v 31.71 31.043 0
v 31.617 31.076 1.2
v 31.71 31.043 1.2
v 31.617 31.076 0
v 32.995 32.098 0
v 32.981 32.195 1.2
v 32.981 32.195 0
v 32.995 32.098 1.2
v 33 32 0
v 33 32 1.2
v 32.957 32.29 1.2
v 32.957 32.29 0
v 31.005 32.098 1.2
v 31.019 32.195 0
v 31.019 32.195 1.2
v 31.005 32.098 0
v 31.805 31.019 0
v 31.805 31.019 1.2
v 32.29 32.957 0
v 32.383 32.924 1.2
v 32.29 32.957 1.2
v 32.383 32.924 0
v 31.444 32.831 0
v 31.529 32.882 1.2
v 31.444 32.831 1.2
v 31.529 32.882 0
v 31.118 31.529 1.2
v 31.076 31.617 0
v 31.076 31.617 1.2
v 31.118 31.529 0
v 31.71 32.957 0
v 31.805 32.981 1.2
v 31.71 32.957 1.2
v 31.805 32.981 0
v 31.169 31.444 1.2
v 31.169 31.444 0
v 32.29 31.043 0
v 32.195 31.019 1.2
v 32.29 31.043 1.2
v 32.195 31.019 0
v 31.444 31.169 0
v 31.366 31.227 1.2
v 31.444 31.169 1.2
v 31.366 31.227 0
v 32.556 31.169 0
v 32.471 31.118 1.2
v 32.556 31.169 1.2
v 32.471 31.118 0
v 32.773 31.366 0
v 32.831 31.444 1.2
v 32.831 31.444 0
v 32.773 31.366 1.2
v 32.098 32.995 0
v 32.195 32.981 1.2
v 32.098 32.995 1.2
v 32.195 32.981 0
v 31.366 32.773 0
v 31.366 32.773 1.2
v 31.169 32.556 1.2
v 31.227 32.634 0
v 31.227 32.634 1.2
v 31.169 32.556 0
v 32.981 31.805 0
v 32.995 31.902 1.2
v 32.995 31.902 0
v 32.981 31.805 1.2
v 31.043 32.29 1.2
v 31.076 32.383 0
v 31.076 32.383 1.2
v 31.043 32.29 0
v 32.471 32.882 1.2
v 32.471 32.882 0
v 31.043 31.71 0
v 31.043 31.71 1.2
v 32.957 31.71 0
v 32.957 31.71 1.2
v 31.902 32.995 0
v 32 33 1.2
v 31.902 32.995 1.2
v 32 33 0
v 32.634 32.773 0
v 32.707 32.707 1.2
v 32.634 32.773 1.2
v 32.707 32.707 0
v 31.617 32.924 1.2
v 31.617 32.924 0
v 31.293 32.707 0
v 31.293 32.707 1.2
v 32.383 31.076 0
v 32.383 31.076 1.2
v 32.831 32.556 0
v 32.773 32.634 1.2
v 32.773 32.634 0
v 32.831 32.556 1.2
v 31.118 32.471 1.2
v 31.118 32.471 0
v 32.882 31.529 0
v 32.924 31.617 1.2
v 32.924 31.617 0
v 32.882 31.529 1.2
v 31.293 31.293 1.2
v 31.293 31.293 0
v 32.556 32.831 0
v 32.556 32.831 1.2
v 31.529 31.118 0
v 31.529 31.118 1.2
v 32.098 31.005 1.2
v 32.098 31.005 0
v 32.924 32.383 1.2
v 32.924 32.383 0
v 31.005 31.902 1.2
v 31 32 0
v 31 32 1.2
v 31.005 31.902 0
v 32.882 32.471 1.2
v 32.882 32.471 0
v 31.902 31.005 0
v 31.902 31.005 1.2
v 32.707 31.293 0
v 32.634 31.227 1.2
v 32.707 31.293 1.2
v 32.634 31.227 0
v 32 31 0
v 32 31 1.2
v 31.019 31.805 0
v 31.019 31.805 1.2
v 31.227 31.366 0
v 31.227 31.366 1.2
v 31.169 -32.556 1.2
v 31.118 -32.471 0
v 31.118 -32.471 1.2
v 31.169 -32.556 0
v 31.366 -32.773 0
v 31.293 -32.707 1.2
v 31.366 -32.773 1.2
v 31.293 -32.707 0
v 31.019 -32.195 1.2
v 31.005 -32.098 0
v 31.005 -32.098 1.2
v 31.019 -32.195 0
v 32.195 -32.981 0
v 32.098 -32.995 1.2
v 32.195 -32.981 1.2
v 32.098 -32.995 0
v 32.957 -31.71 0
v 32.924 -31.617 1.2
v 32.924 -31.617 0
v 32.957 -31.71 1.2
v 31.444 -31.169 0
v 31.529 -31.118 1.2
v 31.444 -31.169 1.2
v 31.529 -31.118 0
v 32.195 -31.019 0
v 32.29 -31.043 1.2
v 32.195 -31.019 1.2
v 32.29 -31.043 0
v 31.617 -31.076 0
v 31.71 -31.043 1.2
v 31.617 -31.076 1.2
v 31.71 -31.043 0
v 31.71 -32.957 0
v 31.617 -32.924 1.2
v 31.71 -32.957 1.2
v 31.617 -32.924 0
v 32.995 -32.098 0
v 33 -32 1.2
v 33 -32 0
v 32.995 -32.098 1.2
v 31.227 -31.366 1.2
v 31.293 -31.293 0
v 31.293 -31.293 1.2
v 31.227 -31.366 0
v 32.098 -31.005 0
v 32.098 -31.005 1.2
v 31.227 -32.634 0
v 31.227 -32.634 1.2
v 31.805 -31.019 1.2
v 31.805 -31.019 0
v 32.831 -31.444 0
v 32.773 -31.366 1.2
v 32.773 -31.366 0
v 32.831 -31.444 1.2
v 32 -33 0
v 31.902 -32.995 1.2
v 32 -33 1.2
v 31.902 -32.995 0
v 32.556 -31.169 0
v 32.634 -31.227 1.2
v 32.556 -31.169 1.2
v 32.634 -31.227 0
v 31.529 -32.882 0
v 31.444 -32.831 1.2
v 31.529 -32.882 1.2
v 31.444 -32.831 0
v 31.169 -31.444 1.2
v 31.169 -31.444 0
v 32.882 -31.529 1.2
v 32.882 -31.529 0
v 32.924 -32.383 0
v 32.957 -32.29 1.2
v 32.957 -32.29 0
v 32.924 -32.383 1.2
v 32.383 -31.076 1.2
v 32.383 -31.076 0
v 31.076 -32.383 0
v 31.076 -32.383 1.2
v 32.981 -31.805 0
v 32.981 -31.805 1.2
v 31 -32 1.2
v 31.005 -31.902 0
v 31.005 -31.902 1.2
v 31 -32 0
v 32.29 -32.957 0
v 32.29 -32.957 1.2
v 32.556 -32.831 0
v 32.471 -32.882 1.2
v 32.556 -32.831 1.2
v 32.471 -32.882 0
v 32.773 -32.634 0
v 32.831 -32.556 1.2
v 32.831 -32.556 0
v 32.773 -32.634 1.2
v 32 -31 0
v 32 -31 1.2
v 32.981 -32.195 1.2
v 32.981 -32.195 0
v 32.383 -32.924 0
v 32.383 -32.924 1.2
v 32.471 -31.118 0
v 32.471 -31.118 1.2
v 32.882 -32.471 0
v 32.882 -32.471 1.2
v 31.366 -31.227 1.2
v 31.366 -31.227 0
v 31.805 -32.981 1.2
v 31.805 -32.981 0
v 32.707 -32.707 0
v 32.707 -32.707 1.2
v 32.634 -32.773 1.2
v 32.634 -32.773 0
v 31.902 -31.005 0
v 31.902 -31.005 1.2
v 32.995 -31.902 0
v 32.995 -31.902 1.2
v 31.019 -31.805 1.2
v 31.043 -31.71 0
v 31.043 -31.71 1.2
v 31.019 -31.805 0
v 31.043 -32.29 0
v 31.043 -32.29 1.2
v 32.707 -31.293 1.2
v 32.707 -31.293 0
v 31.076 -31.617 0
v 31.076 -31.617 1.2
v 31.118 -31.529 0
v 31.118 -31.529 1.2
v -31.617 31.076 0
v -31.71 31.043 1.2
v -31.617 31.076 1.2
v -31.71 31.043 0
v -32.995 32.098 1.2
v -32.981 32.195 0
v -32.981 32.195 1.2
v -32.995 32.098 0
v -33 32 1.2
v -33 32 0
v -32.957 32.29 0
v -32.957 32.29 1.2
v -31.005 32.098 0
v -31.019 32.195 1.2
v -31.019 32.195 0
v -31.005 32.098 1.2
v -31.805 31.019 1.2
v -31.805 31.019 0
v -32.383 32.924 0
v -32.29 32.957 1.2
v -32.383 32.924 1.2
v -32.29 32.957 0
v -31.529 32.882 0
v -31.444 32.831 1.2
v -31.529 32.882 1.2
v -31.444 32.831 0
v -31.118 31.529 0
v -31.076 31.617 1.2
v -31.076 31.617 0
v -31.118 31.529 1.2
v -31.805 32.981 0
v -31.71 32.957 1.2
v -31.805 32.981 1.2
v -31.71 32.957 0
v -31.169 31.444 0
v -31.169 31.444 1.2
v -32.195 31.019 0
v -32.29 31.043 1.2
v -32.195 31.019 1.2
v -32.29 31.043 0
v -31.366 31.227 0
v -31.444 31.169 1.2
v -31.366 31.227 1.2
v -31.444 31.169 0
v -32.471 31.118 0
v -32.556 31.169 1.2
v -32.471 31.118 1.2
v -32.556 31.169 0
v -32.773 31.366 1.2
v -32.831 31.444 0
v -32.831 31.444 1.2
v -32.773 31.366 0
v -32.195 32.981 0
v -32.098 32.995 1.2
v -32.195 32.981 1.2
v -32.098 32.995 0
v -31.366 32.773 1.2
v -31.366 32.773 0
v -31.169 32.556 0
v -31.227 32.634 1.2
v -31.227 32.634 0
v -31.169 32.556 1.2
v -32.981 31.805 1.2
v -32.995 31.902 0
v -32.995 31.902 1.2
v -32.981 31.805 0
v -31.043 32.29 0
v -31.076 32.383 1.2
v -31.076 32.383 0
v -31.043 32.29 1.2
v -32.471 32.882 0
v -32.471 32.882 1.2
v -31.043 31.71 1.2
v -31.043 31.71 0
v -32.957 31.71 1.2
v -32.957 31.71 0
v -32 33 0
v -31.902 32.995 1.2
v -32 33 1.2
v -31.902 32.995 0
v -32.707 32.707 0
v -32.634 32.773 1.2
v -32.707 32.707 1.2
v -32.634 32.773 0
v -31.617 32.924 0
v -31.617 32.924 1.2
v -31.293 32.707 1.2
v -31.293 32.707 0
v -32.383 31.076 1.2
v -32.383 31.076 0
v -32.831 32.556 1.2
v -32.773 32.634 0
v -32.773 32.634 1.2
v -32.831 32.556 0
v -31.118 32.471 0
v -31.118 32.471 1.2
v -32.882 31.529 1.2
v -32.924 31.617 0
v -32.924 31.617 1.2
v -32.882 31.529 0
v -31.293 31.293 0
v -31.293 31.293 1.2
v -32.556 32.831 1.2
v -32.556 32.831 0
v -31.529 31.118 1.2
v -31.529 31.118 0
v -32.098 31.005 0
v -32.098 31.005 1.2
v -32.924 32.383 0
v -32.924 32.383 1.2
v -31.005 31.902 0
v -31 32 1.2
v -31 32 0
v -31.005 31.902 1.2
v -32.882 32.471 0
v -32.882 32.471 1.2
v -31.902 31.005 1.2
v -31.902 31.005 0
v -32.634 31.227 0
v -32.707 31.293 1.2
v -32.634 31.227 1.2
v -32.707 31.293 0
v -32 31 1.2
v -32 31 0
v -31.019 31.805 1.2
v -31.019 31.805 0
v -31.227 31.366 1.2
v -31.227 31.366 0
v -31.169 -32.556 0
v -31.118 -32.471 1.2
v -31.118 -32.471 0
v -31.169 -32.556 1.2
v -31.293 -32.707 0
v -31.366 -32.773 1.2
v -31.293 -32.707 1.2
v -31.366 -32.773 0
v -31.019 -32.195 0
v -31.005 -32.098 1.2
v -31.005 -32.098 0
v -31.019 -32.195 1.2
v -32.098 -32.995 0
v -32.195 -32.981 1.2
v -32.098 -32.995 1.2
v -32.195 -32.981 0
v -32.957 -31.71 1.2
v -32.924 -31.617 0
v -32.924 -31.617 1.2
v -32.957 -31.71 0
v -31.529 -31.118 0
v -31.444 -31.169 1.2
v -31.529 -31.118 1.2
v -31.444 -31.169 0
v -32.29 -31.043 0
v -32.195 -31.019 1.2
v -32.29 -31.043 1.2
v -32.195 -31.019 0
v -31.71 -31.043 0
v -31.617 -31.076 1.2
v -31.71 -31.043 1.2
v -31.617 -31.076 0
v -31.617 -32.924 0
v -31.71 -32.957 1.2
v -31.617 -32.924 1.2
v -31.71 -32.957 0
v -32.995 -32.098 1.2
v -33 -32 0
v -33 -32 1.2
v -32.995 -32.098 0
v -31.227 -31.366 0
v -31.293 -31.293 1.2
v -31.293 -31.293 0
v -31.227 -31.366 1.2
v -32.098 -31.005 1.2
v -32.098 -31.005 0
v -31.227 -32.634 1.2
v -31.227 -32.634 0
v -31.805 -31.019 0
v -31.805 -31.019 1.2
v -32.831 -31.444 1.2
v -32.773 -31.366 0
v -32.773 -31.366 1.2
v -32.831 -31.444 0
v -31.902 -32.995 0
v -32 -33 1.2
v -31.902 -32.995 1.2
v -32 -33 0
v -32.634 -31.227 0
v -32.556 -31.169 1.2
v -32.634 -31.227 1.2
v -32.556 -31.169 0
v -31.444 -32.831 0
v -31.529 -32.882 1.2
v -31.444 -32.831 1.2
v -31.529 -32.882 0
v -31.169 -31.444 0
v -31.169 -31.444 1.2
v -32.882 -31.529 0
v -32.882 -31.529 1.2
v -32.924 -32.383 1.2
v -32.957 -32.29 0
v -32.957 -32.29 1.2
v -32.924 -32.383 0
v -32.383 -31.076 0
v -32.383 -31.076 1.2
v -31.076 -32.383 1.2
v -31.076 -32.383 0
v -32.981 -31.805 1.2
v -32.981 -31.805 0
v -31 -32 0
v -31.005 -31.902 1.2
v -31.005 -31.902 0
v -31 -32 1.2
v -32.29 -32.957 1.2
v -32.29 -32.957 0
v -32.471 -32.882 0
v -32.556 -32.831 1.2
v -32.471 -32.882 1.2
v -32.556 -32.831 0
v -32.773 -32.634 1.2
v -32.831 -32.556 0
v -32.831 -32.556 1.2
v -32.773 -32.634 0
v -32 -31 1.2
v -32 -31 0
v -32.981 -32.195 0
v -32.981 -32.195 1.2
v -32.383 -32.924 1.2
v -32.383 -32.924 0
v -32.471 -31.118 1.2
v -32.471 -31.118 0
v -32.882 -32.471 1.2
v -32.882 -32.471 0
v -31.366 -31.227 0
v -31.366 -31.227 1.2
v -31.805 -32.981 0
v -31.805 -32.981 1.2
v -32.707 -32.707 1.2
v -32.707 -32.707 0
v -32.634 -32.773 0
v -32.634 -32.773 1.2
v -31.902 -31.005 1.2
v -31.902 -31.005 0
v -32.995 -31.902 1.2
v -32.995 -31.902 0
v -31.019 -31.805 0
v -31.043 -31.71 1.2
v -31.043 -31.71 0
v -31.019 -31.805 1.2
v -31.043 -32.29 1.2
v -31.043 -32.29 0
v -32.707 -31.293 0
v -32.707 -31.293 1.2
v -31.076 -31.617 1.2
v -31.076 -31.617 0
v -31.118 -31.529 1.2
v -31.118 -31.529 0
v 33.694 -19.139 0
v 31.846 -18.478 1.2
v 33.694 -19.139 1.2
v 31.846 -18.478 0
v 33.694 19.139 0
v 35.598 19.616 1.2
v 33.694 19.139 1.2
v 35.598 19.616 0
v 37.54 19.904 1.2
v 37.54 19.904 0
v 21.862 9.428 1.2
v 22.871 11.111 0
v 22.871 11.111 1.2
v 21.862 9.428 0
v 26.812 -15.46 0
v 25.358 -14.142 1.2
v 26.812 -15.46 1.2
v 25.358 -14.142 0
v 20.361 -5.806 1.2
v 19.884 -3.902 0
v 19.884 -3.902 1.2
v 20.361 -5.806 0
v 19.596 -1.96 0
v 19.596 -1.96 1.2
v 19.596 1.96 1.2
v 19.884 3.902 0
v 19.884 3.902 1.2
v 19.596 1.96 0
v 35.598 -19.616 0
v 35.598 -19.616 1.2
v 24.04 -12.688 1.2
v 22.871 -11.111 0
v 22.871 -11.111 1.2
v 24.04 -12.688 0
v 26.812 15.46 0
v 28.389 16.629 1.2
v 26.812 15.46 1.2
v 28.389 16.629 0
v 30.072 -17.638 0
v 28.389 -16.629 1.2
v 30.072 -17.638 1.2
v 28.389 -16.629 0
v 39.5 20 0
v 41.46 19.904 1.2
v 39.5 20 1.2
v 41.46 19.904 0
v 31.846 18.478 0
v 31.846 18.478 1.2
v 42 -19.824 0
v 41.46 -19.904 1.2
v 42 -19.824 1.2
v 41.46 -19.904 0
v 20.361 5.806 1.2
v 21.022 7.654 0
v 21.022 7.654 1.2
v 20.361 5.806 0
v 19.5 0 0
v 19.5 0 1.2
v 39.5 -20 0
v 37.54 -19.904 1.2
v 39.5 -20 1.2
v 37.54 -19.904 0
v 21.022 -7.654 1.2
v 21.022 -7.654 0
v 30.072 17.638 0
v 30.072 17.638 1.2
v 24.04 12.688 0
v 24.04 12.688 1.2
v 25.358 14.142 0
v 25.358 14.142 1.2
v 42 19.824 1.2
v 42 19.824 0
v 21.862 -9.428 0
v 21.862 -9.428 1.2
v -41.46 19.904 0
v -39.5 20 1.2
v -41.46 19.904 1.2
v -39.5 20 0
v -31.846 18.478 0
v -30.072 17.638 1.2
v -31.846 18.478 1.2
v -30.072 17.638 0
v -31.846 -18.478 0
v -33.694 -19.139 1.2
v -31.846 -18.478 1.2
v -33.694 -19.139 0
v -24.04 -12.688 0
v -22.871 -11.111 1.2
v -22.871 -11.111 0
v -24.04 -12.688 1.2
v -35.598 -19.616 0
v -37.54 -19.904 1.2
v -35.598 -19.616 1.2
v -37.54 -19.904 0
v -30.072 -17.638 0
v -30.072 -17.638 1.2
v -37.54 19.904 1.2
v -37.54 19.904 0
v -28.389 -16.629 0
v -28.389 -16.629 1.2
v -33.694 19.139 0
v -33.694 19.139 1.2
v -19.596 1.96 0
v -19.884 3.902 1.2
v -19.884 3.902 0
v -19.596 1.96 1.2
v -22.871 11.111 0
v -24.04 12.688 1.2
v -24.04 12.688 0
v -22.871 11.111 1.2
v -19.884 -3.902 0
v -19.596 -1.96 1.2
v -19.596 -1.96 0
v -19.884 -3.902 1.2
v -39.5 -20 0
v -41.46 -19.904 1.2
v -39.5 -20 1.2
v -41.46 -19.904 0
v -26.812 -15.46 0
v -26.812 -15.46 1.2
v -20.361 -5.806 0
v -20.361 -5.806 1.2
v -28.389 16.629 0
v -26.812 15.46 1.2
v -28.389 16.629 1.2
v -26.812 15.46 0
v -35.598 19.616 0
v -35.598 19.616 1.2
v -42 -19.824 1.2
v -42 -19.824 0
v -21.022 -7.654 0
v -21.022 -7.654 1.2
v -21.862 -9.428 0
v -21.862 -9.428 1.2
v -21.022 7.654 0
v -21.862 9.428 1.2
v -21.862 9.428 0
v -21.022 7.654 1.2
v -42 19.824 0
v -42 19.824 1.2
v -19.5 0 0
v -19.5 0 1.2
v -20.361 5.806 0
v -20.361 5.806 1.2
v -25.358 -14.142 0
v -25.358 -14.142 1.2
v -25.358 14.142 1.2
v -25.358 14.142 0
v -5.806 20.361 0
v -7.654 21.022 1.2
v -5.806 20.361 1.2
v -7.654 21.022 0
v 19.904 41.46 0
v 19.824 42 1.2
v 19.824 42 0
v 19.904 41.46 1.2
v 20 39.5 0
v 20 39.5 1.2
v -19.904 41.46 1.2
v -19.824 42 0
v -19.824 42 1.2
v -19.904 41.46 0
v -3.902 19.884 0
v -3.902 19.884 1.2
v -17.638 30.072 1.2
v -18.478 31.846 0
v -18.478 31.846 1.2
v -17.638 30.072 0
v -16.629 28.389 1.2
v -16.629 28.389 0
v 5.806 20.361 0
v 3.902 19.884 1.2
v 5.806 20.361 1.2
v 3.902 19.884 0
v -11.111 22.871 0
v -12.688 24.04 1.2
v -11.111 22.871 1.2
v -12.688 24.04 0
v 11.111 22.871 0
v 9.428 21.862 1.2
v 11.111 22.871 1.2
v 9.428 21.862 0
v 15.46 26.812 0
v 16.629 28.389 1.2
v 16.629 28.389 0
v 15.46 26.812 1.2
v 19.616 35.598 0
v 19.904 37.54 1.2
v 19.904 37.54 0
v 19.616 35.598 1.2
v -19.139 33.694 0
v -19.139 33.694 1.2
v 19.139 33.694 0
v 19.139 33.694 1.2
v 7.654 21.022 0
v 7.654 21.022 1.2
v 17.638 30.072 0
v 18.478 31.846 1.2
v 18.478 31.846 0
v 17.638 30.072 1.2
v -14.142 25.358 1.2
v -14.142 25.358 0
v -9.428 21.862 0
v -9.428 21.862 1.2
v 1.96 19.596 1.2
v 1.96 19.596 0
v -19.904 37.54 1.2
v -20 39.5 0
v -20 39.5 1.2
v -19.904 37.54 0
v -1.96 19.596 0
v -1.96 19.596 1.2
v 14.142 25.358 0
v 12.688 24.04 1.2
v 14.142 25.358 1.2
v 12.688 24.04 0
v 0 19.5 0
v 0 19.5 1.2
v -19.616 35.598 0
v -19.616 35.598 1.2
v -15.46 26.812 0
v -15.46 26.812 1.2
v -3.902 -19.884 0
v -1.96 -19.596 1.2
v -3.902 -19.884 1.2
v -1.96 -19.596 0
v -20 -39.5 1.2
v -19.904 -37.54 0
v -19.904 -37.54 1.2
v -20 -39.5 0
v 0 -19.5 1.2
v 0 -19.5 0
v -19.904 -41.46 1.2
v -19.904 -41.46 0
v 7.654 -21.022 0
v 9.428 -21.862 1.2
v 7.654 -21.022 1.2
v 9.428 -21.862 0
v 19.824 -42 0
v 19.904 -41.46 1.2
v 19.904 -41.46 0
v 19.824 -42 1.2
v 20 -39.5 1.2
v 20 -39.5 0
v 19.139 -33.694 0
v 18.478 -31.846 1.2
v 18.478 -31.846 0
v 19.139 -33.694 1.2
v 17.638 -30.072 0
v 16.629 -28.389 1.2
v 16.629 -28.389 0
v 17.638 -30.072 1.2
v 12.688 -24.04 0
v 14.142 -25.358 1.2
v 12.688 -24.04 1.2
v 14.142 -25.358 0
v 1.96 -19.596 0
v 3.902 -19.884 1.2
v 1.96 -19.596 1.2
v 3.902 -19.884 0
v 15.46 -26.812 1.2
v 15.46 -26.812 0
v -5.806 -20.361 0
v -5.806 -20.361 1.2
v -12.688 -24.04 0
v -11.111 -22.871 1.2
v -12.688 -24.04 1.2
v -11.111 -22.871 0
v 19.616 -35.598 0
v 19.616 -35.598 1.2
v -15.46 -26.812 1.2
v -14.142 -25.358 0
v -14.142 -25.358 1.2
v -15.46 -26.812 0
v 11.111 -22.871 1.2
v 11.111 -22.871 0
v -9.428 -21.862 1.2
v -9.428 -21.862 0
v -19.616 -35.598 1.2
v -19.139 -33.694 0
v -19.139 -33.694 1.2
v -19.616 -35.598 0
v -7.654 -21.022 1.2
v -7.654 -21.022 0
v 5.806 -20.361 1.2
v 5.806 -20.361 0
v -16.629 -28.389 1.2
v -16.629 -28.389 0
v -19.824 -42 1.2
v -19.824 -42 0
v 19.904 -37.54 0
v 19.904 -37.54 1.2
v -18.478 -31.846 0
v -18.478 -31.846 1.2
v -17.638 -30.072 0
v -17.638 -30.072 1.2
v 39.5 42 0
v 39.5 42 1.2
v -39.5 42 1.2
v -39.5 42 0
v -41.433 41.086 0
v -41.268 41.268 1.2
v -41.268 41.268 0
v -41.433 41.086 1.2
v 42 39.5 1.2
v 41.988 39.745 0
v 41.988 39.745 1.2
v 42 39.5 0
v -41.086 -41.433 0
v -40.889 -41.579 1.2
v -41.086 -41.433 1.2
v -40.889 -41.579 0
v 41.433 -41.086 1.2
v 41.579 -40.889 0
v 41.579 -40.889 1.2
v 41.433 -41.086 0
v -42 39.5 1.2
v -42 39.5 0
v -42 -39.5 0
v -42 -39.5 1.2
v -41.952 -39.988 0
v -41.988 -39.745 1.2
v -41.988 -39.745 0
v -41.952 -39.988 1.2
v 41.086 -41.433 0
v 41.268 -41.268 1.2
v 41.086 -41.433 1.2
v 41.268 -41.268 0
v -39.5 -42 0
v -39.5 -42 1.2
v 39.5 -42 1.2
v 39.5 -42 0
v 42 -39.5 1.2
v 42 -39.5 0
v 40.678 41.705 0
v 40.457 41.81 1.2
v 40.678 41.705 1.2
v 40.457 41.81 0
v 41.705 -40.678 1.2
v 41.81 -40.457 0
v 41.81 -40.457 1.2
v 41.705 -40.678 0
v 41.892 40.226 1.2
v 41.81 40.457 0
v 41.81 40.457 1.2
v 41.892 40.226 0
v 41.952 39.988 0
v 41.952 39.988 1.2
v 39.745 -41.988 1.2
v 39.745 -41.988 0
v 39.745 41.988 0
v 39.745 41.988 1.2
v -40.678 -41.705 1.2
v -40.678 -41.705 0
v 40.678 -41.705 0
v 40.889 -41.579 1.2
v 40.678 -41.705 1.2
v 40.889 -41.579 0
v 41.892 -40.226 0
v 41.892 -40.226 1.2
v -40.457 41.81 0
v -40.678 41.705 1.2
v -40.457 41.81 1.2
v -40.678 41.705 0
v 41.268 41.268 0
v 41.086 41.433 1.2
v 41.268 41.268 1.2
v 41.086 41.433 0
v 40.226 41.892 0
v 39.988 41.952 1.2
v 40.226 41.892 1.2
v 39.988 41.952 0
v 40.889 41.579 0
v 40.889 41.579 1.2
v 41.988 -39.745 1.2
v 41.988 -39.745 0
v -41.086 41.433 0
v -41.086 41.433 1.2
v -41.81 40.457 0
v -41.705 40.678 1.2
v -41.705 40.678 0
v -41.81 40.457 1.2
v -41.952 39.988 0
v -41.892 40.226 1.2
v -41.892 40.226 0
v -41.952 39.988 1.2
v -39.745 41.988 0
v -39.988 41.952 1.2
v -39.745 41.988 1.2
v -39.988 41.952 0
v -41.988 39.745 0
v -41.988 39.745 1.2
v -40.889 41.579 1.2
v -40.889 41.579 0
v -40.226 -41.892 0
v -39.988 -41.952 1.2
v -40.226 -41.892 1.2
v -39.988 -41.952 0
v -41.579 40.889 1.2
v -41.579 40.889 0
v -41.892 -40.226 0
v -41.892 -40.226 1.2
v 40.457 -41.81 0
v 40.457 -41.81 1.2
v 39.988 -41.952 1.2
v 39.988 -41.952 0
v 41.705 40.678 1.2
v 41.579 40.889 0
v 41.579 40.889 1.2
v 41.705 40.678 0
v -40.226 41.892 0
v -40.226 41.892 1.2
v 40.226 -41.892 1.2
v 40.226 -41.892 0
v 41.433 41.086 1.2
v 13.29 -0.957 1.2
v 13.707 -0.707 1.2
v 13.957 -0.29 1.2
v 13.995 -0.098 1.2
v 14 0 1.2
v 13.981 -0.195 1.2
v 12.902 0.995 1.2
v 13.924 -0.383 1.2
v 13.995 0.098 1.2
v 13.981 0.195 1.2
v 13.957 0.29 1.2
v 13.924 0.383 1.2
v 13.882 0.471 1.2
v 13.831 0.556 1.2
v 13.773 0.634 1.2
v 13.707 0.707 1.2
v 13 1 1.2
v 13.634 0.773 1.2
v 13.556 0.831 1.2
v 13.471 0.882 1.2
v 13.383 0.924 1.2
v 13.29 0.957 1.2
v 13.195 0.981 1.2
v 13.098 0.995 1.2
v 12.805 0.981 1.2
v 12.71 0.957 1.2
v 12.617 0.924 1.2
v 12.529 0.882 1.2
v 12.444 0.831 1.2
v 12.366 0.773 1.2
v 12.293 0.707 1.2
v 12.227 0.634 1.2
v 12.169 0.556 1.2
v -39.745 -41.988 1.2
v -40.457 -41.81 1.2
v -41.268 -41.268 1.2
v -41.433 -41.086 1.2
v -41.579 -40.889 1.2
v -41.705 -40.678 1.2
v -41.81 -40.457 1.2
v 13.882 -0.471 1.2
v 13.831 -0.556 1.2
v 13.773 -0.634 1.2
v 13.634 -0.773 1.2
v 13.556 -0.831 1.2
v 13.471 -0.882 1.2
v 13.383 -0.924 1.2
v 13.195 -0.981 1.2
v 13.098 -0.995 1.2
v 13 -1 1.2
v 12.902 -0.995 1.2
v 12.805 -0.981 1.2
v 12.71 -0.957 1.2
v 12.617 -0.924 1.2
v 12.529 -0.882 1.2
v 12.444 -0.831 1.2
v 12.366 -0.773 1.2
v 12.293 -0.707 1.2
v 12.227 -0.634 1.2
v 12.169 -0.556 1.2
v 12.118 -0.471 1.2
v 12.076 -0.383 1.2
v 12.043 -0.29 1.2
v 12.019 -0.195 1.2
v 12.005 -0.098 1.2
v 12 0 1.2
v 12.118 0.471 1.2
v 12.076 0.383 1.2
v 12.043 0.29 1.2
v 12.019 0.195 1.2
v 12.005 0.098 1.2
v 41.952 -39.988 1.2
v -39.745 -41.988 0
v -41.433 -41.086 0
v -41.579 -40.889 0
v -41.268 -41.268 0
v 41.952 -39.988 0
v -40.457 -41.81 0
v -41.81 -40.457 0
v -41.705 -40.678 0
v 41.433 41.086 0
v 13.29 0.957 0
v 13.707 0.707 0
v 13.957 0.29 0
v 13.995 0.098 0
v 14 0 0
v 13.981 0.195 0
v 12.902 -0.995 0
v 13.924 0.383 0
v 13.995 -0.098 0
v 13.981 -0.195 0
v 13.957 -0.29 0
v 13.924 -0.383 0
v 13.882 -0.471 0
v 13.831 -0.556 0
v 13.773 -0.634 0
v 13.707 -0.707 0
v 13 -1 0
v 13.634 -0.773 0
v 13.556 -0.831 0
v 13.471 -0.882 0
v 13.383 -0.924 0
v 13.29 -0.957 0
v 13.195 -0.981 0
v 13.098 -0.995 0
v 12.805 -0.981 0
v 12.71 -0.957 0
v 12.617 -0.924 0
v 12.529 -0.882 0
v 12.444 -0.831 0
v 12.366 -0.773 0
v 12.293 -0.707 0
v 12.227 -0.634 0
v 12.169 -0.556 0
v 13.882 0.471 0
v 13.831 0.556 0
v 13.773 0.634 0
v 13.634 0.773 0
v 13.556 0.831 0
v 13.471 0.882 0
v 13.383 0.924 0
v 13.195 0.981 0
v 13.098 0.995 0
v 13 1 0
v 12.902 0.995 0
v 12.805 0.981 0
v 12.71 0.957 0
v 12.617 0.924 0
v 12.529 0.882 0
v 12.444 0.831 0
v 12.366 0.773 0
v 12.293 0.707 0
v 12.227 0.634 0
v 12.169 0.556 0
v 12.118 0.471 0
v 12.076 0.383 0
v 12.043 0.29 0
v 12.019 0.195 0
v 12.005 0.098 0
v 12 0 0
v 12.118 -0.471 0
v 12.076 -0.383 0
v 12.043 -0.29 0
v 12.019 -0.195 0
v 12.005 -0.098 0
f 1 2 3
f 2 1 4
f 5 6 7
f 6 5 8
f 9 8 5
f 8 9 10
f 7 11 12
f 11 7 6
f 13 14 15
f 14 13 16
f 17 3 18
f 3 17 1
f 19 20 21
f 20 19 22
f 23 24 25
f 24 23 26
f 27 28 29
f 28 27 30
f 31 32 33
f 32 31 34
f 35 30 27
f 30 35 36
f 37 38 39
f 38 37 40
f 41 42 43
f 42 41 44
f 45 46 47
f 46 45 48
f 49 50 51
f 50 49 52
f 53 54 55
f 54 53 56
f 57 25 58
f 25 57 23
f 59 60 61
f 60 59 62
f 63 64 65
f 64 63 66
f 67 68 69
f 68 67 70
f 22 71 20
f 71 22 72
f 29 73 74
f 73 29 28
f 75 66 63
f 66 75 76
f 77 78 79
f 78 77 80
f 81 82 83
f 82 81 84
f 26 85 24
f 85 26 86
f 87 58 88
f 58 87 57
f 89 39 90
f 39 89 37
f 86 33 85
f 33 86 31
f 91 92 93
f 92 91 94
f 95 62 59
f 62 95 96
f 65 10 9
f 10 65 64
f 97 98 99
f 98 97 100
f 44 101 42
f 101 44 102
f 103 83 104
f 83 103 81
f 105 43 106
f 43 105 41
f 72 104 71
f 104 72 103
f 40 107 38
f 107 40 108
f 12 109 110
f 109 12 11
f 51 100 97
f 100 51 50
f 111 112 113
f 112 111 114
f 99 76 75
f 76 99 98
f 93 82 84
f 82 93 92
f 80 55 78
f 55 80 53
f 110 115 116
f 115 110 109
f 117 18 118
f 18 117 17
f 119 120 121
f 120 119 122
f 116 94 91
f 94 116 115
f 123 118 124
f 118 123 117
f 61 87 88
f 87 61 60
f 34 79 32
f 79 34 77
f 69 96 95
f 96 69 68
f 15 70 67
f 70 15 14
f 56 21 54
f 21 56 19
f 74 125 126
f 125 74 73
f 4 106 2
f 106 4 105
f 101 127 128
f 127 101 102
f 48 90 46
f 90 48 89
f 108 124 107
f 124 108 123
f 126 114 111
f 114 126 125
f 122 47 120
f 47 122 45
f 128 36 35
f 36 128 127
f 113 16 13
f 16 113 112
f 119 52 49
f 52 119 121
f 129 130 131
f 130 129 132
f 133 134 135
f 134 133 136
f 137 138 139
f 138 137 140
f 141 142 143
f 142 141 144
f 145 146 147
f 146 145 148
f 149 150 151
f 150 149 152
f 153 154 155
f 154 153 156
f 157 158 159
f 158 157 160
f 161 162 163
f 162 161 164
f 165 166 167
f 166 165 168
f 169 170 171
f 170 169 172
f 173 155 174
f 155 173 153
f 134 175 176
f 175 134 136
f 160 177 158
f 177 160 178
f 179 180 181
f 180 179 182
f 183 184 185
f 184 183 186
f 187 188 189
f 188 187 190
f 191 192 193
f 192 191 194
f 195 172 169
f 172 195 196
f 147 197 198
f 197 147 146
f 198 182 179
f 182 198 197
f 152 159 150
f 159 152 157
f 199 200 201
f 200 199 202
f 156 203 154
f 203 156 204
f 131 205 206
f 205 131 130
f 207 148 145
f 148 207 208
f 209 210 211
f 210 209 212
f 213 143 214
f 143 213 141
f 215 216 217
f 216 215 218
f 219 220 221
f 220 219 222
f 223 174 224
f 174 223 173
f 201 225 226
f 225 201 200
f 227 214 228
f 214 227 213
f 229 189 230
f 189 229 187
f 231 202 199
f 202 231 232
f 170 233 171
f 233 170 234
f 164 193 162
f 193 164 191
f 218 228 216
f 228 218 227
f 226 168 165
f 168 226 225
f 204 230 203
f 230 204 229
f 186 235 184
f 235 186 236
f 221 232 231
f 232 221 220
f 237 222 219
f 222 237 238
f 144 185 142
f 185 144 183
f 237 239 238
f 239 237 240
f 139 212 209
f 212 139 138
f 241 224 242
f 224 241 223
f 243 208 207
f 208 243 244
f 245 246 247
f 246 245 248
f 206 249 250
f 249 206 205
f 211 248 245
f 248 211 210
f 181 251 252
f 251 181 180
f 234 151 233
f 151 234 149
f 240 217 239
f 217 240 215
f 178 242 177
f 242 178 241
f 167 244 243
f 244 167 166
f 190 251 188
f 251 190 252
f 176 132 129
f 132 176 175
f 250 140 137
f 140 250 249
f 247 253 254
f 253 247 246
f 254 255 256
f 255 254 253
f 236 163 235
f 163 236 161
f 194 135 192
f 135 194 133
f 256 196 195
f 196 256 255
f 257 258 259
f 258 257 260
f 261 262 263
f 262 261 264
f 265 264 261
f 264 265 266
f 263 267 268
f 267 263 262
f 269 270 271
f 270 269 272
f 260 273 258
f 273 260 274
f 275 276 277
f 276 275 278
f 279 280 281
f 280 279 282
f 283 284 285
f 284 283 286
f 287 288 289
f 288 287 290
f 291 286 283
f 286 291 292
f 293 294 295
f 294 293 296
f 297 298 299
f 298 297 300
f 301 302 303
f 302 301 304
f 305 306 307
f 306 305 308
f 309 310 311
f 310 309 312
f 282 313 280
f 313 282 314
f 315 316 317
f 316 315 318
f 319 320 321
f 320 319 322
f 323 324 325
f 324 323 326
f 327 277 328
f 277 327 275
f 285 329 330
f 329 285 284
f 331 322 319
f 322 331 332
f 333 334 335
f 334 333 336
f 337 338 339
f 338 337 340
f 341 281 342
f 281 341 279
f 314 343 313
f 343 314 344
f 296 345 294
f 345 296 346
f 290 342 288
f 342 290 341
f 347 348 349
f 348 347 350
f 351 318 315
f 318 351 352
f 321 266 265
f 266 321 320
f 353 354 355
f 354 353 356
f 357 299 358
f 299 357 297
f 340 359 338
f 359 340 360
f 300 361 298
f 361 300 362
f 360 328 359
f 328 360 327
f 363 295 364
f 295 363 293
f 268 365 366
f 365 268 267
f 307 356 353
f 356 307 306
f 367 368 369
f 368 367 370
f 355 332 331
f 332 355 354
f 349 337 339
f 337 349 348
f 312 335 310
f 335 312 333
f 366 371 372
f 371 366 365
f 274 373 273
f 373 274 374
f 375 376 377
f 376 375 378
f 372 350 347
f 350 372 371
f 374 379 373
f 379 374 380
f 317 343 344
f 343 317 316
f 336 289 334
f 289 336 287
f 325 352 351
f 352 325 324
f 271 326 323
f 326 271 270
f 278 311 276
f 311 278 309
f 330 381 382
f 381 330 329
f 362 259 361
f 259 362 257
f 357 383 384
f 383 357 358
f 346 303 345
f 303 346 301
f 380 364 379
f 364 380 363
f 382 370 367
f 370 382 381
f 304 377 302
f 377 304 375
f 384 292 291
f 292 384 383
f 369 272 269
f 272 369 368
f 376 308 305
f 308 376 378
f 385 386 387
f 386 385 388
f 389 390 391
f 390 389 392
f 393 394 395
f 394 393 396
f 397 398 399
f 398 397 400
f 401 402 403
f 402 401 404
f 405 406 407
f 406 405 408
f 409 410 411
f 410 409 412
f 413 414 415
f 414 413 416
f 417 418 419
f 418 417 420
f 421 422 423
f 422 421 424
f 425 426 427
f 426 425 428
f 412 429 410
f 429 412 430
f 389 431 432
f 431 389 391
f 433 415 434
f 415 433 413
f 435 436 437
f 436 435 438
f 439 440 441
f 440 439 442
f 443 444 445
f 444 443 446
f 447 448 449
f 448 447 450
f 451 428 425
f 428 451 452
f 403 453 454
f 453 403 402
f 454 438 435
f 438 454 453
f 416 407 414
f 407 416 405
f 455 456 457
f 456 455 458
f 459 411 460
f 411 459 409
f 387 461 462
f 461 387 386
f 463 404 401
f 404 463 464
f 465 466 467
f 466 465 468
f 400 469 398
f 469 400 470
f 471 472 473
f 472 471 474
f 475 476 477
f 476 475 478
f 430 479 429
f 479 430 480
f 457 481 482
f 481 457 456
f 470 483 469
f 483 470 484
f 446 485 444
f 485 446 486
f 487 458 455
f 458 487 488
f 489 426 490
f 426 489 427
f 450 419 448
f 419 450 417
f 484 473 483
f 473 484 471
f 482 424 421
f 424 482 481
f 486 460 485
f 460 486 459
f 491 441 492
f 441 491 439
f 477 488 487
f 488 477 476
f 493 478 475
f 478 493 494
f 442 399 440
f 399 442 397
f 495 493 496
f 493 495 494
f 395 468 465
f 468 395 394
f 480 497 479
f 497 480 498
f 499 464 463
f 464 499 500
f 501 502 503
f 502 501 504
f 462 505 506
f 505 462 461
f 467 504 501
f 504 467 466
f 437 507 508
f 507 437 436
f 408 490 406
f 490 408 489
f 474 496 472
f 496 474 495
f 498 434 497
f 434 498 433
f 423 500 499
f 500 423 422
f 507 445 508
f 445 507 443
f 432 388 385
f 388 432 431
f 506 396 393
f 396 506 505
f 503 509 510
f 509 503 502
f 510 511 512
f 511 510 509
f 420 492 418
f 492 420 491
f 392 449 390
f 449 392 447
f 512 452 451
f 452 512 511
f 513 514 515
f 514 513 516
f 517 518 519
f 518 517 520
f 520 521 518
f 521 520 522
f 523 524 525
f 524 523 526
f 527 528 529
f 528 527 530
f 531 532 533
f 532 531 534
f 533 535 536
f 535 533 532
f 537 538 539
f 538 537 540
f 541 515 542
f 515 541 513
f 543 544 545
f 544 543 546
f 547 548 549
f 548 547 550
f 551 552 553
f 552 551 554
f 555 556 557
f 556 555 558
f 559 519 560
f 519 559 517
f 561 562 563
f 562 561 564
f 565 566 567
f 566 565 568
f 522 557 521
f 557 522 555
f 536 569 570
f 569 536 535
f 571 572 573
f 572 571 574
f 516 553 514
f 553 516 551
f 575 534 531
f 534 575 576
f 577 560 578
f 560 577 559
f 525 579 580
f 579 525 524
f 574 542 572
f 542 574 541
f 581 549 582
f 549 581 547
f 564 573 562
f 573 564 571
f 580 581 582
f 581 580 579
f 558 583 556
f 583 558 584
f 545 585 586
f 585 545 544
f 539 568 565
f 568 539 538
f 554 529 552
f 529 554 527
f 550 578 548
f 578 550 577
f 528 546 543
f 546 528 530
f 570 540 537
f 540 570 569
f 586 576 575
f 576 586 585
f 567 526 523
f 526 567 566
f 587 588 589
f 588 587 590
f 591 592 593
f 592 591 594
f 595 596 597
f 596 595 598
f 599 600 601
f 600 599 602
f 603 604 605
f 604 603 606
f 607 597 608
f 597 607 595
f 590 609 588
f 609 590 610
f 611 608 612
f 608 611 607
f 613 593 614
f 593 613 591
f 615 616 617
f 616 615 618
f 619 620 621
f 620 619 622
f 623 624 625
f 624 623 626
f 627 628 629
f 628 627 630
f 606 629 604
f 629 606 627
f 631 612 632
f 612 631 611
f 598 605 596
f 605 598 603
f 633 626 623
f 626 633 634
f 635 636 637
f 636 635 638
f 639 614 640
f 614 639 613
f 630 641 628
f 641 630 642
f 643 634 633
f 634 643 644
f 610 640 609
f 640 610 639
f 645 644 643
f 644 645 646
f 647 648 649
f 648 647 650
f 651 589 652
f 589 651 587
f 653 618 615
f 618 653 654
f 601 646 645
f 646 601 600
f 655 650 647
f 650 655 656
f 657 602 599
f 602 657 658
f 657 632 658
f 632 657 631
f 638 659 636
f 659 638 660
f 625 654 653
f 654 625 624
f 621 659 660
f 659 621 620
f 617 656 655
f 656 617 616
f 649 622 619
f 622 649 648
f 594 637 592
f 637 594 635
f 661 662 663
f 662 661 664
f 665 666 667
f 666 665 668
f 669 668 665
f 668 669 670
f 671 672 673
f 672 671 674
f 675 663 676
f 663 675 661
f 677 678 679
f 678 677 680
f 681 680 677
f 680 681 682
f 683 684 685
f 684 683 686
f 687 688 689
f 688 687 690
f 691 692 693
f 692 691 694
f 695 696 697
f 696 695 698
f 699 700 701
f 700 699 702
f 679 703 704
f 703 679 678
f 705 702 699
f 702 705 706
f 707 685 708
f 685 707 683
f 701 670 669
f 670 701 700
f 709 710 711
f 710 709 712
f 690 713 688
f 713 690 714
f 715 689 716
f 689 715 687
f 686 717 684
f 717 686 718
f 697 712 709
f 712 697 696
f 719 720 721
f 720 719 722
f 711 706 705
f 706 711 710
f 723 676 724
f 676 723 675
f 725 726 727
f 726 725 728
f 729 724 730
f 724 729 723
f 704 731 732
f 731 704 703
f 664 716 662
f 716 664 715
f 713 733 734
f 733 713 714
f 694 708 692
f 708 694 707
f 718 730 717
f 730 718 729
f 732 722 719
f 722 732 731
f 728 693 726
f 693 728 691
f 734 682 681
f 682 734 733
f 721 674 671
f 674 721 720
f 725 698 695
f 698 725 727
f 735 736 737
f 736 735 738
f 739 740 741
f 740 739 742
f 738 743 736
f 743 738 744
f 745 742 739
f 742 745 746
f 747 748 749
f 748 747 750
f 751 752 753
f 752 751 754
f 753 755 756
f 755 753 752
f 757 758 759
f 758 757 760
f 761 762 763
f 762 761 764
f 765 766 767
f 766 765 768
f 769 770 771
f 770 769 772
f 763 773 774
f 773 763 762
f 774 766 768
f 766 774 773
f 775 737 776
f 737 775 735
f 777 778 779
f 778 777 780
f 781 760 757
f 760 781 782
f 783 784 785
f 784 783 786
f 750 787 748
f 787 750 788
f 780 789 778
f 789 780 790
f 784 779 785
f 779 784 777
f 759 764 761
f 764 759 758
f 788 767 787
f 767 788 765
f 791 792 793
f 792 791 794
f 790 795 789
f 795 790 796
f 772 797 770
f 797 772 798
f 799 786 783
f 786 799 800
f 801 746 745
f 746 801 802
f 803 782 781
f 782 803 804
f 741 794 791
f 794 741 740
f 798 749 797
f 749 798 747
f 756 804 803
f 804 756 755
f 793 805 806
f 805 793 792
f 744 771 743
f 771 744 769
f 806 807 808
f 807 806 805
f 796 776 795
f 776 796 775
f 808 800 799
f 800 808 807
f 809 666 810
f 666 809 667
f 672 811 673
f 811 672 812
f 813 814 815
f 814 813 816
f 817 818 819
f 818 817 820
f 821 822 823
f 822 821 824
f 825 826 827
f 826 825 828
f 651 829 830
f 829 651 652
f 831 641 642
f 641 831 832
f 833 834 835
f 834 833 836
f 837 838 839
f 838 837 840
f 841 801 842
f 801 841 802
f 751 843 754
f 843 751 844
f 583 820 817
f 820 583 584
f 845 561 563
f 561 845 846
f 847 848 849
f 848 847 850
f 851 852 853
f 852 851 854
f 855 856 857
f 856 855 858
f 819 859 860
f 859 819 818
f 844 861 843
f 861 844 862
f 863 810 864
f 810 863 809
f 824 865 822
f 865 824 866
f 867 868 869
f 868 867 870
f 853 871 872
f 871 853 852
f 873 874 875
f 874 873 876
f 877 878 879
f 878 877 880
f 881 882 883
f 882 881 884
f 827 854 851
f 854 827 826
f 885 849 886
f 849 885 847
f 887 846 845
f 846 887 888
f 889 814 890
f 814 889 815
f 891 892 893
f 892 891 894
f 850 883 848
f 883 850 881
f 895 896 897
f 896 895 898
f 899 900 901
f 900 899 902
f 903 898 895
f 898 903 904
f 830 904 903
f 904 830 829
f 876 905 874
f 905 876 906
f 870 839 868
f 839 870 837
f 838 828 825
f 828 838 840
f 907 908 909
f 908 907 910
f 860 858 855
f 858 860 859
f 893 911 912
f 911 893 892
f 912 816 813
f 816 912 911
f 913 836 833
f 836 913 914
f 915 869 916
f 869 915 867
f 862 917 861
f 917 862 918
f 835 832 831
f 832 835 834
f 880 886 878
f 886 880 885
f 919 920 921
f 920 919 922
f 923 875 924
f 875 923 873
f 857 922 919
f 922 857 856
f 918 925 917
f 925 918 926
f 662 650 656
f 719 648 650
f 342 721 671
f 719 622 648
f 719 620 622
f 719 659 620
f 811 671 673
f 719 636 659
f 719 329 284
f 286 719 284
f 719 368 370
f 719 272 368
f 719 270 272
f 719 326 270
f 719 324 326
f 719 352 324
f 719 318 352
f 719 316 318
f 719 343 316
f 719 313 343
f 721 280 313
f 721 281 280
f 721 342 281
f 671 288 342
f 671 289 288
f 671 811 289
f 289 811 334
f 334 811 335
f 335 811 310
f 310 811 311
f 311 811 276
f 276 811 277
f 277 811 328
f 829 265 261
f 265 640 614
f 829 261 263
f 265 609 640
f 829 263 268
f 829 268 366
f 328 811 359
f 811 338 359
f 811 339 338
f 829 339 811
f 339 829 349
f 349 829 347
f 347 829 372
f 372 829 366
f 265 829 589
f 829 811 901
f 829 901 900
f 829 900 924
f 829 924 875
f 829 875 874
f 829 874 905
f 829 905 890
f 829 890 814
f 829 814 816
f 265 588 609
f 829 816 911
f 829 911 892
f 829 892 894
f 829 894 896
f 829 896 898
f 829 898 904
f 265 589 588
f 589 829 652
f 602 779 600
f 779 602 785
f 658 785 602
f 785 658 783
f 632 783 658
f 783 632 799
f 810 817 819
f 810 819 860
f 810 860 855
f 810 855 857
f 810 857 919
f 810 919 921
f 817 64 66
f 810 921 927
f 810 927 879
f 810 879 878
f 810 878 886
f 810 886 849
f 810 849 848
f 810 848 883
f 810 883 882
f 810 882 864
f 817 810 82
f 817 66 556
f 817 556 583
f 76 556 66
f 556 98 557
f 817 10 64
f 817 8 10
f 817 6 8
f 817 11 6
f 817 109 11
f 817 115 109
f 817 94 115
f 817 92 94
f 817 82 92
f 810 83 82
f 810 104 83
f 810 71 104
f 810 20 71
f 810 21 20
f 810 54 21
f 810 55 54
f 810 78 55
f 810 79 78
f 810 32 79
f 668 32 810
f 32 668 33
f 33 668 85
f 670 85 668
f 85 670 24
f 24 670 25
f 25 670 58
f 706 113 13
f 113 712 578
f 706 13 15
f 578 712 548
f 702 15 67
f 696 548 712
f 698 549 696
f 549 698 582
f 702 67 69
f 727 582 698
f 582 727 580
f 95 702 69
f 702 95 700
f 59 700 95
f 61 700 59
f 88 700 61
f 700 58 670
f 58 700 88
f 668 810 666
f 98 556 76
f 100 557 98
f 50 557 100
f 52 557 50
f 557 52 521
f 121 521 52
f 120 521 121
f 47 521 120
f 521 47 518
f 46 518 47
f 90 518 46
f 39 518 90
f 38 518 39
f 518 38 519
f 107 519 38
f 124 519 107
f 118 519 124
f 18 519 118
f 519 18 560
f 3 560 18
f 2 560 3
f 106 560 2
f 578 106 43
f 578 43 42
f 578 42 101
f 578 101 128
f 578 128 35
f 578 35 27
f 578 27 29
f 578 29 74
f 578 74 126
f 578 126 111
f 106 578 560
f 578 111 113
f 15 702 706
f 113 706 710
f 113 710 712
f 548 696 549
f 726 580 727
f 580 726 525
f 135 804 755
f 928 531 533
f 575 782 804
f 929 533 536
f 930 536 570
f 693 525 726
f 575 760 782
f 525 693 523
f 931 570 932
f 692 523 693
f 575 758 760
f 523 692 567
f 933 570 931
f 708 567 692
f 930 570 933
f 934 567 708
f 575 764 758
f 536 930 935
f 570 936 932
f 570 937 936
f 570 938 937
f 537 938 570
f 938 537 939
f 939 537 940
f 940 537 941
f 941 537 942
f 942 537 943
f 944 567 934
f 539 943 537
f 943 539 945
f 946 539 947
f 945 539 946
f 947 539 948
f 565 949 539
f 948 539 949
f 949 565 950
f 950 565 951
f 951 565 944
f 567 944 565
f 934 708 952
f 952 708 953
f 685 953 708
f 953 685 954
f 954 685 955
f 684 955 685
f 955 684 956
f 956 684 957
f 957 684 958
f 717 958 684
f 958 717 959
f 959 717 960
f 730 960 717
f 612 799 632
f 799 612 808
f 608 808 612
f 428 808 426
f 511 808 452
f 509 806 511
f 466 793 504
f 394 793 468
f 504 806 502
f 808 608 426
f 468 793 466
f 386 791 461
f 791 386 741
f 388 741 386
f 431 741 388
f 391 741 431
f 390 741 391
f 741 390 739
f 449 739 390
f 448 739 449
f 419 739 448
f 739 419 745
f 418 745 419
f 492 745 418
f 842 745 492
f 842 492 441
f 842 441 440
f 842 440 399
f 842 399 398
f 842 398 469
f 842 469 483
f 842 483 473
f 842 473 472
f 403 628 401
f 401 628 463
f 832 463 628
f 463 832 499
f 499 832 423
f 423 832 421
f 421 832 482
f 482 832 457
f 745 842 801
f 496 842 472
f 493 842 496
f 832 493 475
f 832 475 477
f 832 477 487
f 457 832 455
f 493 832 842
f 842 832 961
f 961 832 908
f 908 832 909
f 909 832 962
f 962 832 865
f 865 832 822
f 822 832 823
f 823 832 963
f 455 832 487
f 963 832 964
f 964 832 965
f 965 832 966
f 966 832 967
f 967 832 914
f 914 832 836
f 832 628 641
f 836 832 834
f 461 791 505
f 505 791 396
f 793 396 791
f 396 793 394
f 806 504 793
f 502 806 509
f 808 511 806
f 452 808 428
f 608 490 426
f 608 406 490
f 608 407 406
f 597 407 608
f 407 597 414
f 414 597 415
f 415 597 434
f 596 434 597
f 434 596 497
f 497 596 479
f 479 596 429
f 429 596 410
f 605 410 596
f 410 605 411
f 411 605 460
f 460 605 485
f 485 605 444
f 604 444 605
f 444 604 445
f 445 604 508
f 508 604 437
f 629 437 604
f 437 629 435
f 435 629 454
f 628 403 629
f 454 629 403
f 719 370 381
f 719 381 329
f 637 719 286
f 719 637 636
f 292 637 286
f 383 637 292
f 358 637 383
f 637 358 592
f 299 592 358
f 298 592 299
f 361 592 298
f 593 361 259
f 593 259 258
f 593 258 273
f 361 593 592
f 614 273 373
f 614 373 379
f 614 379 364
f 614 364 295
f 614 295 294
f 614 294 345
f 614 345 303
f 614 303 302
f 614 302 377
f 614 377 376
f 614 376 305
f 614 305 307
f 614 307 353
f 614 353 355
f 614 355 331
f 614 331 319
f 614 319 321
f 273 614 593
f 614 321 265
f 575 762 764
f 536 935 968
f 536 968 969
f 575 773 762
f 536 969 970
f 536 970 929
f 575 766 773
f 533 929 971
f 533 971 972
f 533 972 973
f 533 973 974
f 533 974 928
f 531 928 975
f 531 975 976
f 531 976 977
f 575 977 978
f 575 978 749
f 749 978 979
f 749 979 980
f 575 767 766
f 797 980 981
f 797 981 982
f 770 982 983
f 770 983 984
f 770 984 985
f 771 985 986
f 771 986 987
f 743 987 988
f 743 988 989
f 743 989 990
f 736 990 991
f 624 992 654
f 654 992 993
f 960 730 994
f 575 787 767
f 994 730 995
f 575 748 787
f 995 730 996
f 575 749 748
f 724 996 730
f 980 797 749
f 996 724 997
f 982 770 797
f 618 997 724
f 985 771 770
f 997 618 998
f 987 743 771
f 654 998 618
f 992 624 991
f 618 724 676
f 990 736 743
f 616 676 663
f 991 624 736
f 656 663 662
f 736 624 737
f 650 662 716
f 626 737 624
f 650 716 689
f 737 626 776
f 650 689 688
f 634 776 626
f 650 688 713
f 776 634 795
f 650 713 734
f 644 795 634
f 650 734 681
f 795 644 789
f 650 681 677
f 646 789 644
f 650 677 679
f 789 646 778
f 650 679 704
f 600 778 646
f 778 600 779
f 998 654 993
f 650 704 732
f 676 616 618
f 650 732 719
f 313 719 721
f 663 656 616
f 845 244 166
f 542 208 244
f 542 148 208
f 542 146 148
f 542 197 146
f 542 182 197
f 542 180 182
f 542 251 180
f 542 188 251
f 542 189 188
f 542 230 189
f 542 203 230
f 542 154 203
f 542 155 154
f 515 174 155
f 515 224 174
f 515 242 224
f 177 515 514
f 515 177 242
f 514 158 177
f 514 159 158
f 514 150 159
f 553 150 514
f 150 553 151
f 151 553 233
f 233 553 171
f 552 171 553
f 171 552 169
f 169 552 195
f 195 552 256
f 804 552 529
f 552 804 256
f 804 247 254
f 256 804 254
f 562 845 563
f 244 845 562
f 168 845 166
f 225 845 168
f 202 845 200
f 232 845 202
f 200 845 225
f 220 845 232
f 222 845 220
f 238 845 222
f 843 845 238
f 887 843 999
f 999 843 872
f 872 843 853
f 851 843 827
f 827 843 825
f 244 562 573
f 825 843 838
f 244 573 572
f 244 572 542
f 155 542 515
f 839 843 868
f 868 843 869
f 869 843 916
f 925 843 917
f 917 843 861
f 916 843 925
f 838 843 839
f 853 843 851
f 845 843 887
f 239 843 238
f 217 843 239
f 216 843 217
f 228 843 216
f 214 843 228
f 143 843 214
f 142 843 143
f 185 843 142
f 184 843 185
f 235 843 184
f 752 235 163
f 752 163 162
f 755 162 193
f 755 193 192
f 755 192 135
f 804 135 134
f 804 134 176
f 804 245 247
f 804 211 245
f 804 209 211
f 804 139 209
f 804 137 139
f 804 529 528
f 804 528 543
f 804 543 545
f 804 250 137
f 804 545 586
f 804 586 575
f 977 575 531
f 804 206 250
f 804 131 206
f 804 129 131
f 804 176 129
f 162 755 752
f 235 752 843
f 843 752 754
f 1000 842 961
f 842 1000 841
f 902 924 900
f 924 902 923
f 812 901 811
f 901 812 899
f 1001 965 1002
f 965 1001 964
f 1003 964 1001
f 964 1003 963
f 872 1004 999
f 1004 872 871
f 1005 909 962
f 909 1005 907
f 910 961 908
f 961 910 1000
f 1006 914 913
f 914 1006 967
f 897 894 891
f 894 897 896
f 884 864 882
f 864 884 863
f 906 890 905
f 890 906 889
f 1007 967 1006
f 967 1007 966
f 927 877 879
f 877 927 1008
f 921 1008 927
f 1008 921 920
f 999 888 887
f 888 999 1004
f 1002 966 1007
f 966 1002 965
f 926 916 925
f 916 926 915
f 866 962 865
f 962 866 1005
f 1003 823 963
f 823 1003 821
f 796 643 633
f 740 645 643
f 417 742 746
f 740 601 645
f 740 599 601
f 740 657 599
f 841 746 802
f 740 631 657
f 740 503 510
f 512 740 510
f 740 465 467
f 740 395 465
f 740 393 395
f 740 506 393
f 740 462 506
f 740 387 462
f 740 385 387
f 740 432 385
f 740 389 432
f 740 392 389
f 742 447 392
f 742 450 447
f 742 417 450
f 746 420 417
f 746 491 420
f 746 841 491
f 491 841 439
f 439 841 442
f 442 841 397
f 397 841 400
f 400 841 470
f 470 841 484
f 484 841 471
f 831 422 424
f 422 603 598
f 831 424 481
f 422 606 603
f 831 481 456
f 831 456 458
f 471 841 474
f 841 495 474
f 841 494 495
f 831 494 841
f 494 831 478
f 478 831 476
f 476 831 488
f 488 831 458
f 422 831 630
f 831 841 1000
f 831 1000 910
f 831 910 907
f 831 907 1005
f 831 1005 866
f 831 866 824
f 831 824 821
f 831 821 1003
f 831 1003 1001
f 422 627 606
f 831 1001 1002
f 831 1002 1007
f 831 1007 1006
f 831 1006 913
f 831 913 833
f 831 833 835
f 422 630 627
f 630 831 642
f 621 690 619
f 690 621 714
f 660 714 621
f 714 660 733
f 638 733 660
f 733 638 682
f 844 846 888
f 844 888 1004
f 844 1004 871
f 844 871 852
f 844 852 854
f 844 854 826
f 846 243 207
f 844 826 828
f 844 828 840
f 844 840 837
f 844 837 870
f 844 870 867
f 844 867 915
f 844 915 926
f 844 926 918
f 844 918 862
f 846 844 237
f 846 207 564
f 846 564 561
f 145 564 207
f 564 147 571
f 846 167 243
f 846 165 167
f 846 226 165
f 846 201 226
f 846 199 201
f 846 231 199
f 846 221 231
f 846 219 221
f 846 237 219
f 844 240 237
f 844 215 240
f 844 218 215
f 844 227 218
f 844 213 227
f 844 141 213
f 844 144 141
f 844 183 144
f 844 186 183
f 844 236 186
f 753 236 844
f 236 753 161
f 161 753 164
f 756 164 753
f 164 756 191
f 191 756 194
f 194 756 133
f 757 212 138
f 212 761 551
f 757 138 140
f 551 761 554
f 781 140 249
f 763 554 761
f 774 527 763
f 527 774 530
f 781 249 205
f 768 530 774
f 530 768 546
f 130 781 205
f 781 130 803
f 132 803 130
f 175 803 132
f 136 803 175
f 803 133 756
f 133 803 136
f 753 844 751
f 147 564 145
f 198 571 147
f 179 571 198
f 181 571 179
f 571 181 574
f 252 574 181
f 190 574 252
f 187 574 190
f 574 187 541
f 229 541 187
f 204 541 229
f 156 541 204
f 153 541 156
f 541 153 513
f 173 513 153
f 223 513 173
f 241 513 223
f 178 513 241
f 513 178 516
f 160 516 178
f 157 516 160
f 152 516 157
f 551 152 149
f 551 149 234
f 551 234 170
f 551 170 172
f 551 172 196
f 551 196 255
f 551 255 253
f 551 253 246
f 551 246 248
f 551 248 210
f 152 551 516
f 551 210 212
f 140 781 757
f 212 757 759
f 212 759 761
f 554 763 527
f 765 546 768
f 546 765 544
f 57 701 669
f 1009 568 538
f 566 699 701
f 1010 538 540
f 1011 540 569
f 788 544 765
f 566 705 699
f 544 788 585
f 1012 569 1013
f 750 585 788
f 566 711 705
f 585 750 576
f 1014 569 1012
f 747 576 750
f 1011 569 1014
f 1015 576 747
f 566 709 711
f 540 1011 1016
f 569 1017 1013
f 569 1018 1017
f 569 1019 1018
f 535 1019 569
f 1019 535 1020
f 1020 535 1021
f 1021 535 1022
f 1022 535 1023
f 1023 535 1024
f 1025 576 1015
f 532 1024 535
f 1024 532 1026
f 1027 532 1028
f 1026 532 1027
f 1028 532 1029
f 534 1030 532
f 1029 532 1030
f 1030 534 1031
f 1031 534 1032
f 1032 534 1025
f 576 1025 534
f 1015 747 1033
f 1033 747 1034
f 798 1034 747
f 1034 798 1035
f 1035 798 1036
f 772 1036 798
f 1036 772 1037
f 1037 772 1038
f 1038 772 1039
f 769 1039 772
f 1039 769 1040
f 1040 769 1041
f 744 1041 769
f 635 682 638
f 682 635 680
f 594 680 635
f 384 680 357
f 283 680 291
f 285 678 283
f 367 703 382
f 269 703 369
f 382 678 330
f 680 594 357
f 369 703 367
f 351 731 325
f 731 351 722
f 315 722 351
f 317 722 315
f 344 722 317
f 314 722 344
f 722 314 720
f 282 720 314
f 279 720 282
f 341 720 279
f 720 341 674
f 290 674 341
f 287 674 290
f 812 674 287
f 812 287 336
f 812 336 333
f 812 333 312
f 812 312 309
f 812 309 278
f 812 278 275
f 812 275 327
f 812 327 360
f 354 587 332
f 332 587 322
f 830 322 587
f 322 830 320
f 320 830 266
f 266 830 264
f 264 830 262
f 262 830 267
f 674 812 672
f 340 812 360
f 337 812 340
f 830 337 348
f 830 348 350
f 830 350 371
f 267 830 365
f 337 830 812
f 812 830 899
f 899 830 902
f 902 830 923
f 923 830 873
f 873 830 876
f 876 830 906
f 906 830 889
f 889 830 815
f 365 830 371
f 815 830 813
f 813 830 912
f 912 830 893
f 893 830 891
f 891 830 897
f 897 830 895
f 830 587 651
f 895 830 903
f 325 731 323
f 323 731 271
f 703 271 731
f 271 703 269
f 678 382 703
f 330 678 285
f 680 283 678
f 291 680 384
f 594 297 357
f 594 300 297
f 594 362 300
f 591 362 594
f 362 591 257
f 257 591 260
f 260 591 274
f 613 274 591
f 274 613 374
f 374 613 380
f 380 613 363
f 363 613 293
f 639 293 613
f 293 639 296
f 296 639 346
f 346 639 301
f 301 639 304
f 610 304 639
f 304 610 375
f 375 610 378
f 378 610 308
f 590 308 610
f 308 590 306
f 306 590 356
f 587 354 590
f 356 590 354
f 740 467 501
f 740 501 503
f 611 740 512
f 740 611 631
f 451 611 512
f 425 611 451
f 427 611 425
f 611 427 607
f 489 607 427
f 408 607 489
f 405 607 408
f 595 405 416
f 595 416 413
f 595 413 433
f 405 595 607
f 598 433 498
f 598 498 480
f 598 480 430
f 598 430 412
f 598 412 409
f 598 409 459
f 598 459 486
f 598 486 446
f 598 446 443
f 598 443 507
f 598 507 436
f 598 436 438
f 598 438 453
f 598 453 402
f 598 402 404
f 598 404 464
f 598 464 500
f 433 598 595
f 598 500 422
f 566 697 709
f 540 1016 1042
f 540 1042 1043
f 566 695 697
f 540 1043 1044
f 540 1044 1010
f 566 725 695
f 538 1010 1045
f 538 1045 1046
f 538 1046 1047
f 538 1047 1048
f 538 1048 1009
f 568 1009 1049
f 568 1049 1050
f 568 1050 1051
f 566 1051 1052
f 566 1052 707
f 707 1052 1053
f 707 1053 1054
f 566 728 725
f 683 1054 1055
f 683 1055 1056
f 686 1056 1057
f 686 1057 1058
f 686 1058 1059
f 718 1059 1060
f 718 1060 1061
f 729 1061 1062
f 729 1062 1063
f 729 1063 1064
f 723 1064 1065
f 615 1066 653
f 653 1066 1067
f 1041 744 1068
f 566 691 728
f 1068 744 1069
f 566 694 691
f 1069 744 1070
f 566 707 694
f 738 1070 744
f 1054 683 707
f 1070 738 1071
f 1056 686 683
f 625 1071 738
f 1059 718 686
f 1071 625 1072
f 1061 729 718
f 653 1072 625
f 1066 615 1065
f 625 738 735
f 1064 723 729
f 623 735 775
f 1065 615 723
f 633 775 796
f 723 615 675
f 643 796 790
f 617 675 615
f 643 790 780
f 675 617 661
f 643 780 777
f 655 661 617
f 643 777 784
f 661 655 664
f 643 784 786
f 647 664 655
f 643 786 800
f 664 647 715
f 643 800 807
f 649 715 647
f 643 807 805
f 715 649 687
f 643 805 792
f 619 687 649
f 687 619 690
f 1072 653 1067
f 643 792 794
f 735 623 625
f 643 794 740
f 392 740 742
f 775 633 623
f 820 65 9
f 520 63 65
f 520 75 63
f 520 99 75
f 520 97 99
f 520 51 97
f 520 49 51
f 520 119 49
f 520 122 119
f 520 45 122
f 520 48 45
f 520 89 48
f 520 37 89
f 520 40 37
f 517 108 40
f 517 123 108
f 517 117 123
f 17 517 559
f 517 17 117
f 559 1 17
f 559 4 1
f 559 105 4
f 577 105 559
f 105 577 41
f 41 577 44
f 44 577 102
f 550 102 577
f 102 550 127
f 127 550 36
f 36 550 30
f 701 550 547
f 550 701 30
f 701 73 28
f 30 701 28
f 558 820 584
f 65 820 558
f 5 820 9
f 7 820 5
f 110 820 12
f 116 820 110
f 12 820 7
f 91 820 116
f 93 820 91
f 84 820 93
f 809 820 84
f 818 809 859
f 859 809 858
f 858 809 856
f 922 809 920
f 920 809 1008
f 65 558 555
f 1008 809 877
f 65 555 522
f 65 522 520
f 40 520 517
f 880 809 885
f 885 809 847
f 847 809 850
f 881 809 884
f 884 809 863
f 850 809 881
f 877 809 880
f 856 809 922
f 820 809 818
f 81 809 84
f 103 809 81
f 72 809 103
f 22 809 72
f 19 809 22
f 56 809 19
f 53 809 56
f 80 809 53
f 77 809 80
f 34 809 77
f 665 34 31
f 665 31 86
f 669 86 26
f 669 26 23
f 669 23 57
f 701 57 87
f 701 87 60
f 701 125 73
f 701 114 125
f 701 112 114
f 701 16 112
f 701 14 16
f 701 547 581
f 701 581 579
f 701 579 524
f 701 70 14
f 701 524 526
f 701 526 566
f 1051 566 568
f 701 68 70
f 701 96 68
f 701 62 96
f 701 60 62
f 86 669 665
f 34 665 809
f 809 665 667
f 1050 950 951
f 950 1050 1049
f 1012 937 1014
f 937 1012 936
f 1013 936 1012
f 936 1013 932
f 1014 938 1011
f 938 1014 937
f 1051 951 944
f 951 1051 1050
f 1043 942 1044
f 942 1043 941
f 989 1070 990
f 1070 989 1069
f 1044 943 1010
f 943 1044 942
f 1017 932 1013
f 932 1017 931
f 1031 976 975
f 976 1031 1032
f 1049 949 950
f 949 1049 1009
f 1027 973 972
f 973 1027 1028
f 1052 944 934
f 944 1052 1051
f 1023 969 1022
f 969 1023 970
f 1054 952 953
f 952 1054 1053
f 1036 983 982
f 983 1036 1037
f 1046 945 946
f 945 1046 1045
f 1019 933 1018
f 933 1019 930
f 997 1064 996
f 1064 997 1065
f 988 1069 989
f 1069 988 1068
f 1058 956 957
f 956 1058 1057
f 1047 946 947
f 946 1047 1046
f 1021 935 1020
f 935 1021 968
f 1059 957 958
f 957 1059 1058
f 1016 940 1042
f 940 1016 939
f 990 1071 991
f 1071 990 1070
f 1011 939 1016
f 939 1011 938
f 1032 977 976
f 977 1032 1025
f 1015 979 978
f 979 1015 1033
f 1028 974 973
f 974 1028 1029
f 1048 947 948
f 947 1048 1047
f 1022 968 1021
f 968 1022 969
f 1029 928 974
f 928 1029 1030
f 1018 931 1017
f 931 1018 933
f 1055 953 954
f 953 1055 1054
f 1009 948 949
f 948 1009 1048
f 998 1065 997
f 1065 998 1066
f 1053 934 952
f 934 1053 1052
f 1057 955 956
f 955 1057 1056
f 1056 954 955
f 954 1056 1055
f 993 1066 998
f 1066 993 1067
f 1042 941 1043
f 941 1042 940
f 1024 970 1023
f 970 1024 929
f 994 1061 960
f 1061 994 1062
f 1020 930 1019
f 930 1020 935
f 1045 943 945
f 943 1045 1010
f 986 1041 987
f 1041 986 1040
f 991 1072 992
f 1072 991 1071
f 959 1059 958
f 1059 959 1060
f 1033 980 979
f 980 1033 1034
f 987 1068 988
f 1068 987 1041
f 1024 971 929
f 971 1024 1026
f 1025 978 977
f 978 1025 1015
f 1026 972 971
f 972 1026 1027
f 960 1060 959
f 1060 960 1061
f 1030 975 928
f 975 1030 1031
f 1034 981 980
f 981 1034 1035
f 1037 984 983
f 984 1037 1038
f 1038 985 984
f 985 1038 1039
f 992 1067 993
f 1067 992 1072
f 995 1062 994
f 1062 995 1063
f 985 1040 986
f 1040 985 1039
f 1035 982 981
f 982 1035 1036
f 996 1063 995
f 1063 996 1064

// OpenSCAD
// file: syms.scad
module symY(t) {
    translate(t)
        children();
    mirror([0,1,0])
        translate(t)
            children();
}
module symX(t) {
    translate(t)
        children();
    mirror([1,0,0])
        translate(t)
            children();
}

module symZ(t) {
    translate(t)
        children();
    mirror([0,0,1])
        translate(t)
            children();
}

module	symXY(t) {
	tx=t[0];
	ty=t[1];
	tz=t[2];
	symX([tx,0,0])
	symY([0,ty,tz])
		children();
}

module magnetCut(D,S) {
    cylinder(d=D,h=10);
    for(d=[45,-45])
    rotate(d)
    cube([2*D,S,30],center=true);
}


// calculates the radius from "segment" paramers:
// https://en.wikipedia.org/wiki/Circular_segment
function    circleSlice2radius2(c,h) = (c*c/8/h)+ h/2;

function toInt(str) = 
    let(d = [for (s = str) ord(s) - 48], l = len(d) - 1)
    [for (i = 0, a = d[i];i <= l;i = i + 1, a = 10 * a + d[i]) a][l];
        
// main file
use<syms.scad>

$fn=64;

U=79;
V=79;
H=1.2;

Q=(79-64)/2;
D=2;

difference() {
    hull()
    symX([U/2,0,0])
    symY([0,V/2,0])
    cylinder(d=5,h=H);

    symX([64/2,0,0])
    symY([0,64/2,0])
    cylinder(d=D,h=30,center=true);
    
    translate([-79/2+92-39.5,0,0])
    cylinder(d=D,h=30,center=true);

    symX([U/2,0,0])
    cylinder(d=40,h=30,center=true);

    symY([0,U/2,0])
    cylinder(d=40,h=30,center=true);
    
}
